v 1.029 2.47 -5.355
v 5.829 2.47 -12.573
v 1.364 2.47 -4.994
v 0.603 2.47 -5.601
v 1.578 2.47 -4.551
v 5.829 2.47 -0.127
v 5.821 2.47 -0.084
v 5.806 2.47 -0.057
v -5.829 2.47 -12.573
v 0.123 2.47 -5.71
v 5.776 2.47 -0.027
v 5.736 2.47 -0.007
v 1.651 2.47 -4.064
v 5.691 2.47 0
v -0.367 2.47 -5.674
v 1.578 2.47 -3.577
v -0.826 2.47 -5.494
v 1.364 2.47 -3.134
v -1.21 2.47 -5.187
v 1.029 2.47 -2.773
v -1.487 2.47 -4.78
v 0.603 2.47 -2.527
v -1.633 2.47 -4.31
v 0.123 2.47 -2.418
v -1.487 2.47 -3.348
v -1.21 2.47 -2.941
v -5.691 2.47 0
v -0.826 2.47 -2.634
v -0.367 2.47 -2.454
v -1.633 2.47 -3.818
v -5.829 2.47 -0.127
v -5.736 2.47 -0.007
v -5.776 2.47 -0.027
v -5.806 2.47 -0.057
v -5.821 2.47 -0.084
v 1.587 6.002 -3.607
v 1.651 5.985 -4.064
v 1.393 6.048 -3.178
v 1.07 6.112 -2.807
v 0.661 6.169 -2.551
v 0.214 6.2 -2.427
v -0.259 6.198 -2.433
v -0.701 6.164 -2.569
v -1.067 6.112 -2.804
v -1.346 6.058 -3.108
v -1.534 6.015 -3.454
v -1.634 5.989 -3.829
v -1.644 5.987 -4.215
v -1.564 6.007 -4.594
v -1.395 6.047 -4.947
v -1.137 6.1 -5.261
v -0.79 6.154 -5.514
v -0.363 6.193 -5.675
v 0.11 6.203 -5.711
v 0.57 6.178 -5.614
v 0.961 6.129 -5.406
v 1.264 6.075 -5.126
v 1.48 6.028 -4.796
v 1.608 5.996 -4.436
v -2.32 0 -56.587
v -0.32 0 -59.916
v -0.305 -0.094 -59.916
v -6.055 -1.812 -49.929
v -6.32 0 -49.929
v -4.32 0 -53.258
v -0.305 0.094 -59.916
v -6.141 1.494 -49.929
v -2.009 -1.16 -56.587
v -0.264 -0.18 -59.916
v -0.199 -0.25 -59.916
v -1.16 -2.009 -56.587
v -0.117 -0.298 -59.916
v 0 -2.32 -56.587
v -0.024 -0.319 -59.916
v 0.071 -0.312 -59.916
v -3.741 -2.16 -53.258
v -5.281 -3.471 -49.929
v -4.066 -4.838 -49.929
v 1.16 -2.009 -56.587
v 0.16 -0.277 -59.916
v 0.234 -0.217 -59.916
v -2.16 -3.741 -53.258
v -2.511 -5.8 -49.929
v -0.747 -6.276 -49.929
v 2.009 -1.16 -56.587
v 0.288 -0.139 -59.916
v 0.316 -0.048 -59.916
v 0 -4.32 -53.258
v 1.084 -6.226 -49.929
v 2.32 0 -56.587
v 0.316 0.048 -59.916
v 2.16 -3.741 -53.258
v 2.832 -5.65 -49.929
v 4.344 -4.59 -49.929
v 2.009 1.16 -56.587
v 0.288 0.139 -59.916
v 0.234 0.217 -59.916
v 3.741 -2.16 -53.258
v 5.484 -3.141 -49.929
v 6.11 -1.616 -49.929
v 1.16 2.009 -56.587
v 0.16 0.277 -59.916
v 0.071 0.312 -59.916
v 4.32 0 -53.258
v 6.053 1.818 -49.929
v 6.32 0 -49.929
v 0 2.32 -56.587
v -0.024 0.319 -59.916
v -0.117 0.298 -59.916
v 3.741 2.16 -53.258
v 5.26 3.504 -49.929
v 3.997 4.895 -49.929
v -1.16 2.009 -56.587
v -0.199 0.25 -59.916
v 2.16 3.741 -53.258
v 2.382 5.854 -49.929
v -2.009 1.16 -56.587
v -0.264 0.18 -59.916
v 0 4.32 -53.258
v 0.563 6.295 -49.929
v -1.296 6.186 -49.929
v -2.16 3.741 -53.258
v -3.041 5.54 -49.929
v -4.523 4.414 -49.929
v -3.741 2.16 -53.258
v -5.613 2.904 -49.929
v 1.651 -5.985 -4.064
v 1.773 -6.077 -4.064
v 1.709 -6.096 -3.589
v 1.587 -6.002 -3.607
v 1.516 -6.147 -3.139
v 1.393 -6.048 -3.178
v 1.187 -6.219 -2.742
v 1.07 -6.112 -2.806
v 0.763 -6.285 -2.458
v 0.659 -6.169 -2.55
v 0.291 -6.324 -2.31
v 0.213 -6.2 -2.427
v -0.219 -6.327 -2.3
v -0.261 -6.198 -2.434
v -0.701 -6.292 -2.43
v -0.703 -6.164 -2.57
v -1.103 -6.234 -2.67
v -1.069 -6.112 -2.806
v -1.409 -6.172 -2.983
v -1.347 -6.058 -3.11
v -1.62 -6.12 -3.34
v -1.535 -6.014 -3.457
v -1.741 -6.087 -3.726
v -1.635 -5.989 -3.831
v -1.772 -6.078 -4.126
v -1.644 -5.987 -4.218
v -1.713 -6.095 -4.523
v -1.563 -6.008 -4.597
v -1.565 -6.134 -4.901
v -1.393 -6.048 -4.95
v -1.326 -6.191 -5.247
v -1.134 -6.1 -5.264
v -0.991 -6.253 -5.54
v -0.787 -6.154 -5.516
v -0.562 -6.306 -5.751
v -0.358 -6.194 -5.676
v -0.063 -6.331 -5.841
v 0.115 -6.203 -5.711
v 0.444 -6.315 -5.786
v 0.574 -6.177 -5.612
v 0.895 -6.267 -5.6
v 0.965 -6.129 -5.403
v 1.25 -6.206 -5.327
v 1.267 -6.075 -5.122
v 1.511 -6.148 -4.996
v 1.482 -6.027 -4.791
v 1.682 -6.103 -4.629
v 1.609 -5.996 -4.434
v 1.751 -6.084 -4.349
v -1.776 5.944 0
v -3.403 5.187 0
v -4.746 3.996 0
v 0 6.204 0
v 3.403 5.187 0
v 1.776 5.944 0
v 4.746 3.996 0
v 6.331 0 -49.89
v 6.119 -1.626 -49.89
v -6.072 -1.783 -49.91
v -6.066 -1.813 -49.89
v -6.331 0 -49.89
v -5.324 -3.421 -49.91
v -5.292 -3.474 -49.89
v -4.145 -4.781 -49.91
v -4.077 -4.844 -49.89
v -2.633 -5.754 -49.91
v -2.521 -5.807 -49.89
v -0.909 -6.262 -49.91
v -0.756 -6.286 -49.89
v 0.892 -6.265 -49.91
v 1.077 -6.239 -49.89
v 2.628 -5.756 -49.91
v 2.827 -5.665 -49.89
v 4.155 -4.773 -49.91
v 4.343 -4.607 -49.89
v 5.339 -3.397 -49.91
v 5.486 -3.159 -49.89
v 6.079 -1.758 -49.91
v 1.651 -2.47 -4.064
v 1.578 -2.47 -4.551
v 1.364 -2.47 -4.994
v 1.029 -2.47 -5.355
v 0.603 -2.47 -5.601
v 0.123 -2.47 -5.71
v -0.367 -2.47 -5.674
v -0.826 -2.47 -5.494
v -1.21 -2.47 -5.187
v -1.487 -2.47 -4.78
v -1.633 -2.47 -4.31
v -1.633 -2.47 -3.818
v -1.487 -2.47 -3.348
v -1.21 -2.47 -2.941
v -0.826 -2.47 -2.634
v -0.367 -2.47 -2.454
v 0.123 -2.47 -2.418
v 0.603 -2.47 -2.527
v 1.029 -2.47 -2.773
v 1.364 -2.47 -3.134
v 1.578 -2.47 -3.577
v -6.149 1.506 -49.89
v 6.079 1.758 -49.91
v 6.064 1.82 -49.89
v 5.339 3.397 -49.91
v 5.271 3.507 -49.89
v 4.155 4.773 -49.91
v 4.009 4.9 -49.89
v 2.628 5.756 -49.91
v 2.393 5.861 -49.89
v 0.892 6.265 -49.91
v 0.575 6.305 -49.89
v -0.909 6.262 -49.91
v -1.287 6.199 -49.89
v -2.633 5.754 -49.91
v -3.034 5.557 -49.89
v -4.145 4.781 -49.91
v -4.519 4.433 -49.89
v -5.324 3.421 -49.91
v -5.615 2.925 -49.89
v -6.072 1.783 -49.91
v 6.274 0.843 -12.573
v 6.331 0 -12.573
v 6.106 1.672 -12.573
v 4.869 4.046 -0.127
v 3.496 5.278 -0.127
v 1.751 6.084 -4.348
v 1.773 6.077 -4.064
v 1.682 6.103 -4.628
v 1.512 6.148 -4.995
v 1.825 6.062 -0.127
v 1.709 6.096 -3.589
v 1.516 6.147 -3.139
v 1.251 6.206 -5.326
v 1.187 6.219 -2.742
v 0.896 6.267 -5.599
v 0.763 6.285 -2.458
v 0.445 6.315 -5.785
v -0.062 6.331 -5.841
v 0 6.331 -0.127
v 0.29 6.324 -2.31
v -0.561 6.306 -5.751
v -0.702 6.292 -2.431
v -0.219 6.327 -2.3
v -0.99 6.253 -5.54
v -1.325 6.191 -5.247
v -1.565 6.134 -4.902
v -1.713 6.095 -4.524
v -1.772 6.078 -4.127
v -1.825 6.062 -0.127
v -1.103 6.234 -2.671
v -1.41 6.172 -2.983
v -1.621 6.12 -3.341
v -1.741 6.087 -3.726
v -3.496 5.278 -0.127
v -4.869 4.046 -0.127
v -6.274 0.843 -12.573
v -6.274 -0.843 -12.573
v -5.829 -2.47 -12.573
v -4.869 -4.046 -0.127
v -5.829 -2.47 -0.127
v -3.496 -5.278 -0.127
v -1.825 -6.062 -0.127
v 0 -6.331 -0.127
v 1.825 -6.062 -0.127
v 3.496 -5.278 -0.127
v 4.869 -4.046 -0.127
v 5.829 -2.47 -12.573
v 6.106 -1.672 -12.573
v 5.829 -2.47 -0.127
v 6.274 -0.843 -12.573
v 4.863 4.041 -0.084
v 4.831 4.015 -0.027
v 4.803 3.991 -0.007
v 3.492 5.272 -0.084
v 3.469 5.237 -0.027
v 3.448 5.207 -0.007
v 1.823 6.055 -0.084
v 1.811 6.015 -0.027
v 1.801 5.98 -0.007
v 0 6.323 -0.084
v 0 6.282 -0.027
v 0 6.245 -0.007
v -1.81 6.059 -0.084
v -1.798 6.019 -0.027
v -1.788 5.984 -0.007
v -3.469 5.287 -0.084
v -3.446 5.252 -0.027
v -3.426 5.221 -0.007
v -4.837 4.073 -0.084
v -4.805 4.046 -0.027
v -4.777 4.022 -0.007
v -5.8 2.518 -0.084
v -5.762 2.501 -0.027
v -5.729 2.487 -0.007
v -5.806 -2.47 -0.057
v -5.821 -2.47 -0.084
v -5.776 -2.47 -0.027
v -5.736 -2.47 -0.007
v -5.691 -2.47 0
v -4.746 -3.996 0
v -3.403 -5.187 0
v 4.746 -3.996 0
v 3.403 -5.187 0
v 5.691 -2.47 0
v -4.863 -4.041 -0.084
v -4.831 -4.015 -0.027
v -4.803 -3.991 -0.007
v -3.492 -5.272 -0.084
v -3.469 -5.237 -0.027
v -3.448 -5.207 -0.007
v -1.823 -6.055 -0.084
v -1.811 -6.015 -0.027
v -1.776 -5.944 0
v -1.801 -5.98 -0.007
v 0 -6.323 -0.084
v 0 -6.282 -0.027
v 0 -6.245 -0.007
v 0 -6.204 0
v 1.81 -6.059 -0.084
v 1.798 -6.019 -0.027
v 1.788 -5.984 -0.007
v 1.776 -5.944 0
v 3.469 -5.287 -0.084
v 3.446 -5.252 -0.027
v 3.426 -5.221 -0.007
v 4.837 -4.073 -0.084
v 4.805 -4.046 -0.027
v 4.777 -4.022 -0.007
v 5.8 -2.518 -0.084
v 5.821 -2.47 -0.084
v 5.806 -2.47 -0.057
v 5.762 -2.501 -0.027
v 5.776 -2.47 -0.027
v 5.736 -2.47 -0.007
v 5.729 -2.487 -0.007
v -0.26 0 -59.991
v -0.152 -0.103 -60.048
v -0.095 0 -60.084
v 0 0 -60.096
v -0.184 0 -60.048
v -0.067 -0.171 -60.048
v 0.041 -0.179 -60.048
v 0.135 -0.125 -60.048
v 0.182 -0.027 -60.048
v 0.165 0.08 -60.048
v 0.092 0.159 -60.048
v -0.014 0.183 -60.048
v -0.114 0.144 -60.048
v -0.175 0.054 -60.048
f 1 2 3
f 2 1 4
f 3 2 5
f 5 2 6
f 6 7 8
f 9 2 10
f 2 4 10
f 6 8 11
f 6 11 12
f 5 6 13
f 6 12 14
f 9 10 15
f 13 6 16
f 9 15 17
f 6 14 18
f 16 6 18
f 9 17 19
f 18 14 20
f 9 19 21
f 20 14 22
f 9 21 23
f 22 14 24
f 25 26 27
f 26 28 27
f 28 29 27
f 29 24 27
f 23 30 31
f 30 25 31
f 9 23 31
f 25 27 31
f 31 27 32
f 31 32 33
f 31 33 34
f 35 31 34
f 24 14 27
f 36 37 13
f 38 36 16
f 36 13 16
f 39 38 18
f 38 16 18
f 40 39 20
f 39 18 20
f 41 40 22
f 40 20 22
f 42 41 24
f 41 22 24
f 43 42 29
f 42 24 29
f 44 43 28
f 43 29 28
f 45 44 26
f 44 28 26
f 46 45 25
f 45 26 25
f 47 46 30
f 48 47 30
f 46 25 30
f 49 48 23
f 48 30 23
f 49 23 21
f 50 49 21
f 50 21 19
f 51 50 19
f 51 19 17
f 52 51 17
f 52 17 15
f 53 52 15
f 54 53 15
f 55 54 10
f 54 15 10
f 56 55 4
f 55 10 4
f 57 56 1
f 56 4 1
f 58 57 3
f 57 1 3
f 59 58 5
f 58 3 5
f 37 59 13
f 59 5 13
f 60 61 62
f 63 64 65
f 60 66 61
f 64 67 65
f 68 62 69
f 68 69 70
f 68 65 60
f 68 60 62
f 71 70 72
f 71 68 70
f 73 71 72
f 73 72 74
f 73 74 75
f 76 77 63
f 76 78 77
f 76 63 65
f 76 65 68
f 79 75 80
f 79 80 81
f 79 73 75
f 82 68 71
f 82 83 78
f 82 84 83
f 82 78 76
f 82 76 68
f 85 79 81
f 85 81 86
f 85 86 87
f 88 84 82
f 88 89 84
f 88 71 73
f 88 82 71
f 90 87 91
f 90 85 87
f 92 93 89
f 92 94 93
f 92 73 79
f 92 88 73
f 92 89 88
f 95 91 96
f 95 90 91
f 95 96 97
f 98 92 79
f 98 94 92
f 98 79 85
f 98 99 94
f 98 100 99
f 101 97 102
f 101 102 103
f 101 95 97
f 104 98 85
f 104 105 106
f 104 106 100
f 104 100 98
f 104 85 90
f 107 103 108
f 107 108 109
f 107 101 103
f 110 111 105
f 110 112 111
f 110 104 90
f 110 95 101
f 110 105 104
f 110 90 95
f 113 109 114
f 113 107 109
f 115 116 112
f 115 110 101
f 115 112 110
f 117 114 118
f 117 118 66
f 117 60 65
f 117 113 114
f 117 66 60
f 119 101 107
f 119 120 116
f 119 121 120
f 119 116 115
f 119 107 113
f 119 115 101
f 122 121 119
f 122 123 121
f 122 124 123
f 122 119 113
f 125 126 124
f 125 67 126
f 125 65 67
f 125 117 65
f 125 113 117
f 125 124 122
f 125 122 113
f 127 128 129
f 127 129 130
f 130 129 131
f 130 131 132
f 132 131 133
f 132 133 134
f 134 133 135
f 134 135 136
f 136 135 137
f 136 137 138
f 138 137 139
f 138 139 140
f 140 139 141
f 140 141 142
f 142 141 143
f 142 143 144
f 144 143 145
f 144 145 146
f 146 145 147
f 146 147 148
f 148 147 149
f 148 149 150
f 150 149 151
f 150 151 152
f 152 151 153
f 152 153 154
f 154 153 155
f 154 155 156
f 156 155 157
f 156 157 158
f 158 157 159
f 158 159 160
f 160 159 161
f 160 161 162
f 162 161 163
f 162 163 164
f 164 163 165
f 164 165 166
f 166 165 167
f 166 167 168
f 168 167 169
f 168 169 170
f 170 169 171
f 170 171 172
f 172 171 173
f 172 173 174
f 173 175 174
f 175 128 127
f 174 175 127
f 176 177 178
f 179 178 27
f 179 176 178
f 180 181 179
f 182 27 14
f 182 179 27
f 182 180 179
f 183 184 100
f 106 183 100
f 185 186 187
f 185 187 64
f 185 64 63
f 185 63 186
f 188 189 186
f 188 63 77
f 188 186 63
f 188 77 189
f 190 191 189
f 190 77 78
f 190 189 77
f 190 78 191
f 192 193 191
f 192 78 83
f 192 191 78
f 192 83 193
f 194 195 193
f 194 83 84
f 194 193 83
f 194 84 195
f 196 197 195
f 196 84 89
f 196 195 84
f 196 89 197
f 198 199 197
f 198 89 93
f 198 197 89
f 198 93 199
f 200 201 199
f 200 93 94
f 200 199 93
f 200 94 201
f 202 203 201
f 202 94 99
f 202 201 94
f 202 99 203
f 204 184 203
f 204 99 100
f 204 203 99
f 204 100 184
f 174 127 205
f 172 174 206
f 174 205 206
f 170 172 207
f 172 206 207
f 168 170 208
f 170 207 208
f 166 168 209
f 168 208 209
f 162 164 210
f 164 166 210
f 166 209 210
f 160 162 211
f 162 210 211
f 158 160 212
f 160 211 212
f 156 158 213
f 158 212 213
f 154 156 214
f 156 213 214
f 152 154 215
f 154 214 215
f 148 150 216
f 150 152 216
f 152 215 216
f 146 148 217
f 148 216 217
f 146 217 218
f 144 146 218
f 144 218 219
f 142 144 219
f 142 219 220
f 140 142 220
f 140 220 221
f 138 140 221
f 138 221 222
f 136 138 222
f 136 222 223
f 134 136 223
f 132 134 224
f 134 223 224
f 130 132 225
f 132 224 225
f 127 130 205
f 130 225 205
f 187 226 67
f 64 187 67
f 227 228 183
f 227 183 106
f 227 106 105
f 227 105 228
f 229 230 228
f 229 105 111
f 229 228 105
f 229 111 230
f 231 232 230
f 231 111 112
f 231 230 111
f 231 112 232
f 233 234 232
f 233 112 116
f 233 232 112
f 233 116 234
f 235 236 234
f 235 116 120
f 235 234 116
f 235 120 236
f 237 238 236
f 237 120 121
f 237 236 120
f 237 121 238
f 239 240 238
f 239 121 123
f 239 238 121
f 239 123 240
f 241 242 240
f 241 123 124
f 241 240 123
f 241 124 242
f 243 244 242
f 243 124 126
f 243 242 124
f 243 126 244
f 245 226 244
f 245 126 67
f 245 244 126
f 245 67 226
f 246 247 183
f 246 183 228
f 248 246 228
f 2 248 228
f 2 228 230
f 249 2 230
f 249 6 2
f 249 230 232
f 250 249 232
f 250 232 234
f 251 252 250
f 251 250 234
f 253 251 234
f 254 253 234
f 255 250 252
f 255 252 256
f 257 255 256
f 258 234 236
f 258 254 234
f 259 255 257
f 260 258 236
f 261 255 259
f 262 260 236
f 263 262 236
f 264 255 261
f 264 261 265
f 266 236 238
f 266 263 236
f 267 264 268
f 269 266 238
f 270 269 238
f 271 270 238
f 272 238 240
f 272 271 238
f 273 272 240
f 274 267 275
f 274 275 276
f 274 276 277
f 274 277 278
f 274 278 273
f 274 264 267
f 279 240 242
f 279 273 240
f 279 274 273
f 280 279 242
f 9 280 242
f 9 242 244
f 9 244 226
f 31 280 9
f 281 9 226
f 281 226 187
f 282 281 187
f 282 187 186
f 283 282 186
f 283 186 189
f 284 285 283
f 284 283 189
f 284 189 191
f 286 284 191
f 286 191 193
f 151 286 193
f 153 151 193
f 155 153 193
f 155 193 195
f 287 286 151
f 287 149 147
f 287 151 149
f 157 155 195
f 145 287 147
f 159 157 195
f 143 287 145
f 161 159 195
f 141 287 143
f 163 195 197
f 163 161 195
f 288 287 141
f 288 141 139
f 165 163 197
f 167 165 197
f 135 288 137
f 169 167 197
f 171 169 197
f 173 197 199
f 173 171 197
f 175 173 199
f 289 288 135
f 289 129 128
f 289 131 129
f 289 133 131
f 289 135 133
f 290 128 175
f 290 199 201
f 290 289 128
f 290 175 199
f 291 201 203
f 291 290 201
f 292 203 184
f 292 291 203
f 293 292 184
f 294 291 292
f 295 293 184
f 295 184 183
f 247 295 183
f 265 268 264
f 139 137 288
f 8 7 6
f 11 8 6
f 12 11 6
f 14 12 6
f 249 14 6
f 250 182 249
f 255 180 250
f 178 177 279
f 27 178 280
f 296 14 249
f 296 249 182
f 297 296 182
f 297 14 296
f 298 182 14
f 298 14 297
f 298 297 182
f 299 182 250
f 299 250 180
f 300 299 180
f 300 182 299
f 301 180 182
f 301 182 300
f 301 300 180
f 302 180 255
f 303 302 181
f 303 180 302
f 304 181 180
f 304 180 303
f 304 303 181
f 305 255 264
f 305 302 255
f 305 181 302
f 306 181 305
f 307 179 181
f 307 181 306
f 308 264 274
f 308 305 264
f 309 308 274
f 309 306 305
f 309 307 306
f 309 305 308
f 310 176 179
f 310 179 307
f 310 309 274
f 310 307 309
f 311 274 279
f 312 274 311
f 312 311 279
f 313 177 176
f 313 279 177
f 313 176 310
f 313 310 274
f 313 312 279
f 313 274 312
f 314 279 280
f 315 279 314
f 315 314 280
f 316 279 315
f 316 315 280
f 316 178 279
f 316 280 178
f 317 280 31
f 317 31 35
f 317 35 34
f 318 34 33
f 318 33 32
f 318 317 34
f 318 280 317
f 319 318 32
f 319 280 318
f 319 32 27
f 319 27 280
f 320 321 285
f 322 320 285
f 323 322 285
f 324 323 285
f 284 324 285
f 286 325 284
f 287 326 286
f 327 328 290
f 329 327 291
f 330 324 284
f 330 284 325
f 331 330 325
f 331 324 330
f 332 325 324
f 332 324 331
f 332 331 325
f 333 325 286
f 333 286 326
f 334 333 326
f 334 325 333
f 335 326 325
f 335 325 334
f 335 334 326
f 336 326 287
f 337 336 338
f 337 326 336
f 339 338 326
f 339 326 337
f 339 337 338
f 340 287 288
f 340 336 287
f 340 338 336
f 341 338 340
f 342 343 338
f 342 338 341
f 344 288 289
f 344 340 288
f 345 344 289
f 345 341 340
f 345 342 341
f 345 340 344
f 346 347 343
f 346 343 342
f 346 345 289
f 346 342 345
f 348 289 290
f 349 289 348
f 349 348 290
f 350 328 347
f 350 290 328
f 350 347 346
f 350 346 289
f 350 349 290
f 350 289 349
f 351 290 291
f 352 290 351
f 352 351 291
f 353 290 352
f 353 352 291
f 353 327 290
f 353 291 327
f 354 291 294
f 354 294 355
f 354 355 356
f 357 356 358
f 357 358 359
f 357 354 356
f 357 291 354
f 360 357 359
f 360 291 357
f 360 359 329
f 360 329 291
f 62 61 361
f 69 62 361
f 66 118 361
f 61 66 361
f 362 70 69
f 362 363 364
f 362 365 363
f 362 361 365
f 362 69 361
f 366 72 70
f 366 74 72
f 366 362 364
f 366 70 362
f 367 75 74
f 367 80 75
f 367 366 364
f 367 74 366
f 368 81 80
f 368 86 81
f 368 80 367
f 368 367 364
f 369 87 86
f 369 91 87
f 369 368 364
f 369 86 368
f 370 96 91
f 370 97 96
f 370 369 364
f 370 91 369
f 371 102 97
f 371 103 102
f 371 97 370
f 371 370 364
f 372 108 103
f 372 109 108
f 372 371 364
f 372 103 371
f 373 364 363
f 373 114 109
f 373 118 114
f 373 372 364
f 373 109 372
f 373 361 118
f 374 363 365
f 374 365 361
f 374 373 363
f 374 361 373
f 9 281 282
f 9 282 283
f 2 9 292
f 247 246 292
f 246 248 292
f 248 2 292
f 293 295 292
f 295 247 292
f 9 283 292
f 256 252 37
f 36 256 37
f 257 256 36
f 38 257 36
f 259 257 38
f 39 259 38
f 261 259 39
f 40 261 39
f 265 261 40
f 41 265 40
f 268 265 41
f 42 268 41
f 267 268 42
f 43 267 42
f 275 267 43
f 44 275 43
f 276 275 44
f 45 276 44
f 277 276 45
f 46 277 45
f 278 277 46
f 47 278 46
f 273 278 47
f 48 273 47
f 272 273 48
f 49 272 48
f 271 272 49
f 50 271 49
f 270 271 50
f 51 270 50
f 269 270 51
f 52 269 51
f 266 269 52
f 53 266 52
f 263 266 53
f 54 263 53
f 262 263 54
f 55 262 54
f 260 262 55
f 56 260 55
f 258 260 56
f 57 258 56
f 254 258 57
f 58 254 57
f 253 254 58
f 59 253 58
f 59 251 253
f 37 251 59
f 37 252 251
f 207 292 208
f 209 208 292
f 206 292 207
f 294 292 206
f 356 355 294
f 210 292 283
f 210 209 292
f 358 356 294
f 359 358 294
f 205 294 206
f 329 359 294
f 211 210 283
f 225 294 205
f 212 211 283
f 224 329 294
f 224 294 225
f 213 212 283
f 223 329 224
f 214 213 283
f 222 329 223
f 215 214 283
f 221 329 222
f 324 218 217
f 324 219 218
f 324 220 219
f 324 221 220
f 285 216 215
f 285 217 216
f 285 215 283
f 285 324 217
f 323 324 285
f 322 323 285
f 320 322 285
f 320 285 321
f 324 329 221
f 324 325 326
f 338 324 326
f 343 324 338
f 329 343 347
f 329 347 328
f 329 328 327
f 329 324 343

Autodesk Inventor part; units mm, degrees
ref_plane "YZ Plane" through (0, 0, 0) normal (1, 0, 0) x (0, 1, 0)
ref_plane "XZ Plane" through (0, 0, 0) normal (0, 1, 0) x (-1, 0, 0)
ref_plane "XY Plane" through (0, 0, 0) normal (0, 0, 1) x (1, 0, 0)
sketch "Sketch1" plane through (0, 0, 0) normal (0, 0, 1) x (1, 0, 0)
  circle A0 centre (0, 0) radius 6.3309
  dimension "d0" = 12.6619
extrude "Extrusion1" add sketch "Sketch1" against normal blind 60.0964
sketch "Sketch2" plane through (0, 0, 0) normal (0, 1, 0) x (-1, 0, 0)
  line L0 (-6.3309, -60.0964) -> (-6.3309, 0) projected
  line L1 (-6.3309, 0) -> (6.3309, 0) projected
  line L2 (6.3309, 0) -> (6.3309, -60.0964) projected
  line L3 (6.3309, -60.0964) -> (-6.3309, -60.0964) projected
  line L4 (6.3309, -12.573) -> (-6.3309, -12.573)
  point P0 (0, 0)
  dimension "d3" = 12.573
extrude "Extrusion2" cut sketch "Sketch2" along normal mid plane 4.9403 contours L0 L1 L2 L4
sketch "Sketch3" plane through (0, 2.4702, 0) normal (0, -1, 0) x (1, 0, 0)
  line L0 (-5.8292, 0) -> (5.8292, 0) construction
  line L1 (5.8292, 0) -> (5.8292, -12.573) construction
  line L2 (-5.8292, -12.573) -> (5.8292, -12.573) construction
  line L3 (-5.8292, -60.0964) -> (-5.8292, -12.573) construction
  line L4 (5.8292, -60.0964) -> (-5.8292, -60.0964) construction
  line L5 (5.8292, -12.573) -> (5.8292, -60.0964) construction
  line L6 (-5.8292, -12.573) -> (-5.8292, 0) construction
  line L7 (0, 0) -> (0, -12.573) construction
  circle A0 centre (0, -4.064) radius 1.651
  dimension "d6" = 3.302
  dimension "d7" = 4.064
extrude "Extrusion3" cut sketch "Sketch3" along normal through all both and the other way through all
sketch "Sketch4" plane through (0, 0, 0) normal (0, 1, 0) x (-1, 0, 0)
  line L0 (-6.3309, -12.573) -> (6.3309, -12.573) projected
  line L1 (6.3309, -12.573) -> (6.3309, -60.0964) projected
  line L2 (6.3309, -60.0964) -> (-6.3309, -60.0964) projected
  line L3 (-6.3309, -60.0964) -> (-6.3309, -12.573) projected
  line L4 (0, -60.0964) -> (0, -48.5629) construction
  line L5 (6.3309, -49.911) -> (0.3196, -59.9156)
  arc A0 (0, -60.0964) -> (0.3196, -59.9156) centre (0, -59.7236) ccw
  line L6 (0, -72.1662) -> (0, 12.0277) projected
  point P0 (0, 0)
  dimension "d10" = 10.1854
  dimension "d11" = 31
revolve "Revolution1" cut sketch "Sketch4" angle 360 about axis through (0, 0, -10) along (0, 0, 1) contours A0 L5 L1 L2
fillet "Fillet1" radius 0.0762 2 edges at (0, -6.3309, -49.911) (0, 6.3309, -49.911)
fillet "Fillet2" radius 0.127 2 edges at (0, -6.3309, 0) (0, 6.3309, 0)
chamfer "Chamfer1" distance 0.127 angle 45 2 edges at (-1.651, -6.1119, -4.0553) (-1.651, 6.1119, -4.0553)
properties part number "solenoid pin"
